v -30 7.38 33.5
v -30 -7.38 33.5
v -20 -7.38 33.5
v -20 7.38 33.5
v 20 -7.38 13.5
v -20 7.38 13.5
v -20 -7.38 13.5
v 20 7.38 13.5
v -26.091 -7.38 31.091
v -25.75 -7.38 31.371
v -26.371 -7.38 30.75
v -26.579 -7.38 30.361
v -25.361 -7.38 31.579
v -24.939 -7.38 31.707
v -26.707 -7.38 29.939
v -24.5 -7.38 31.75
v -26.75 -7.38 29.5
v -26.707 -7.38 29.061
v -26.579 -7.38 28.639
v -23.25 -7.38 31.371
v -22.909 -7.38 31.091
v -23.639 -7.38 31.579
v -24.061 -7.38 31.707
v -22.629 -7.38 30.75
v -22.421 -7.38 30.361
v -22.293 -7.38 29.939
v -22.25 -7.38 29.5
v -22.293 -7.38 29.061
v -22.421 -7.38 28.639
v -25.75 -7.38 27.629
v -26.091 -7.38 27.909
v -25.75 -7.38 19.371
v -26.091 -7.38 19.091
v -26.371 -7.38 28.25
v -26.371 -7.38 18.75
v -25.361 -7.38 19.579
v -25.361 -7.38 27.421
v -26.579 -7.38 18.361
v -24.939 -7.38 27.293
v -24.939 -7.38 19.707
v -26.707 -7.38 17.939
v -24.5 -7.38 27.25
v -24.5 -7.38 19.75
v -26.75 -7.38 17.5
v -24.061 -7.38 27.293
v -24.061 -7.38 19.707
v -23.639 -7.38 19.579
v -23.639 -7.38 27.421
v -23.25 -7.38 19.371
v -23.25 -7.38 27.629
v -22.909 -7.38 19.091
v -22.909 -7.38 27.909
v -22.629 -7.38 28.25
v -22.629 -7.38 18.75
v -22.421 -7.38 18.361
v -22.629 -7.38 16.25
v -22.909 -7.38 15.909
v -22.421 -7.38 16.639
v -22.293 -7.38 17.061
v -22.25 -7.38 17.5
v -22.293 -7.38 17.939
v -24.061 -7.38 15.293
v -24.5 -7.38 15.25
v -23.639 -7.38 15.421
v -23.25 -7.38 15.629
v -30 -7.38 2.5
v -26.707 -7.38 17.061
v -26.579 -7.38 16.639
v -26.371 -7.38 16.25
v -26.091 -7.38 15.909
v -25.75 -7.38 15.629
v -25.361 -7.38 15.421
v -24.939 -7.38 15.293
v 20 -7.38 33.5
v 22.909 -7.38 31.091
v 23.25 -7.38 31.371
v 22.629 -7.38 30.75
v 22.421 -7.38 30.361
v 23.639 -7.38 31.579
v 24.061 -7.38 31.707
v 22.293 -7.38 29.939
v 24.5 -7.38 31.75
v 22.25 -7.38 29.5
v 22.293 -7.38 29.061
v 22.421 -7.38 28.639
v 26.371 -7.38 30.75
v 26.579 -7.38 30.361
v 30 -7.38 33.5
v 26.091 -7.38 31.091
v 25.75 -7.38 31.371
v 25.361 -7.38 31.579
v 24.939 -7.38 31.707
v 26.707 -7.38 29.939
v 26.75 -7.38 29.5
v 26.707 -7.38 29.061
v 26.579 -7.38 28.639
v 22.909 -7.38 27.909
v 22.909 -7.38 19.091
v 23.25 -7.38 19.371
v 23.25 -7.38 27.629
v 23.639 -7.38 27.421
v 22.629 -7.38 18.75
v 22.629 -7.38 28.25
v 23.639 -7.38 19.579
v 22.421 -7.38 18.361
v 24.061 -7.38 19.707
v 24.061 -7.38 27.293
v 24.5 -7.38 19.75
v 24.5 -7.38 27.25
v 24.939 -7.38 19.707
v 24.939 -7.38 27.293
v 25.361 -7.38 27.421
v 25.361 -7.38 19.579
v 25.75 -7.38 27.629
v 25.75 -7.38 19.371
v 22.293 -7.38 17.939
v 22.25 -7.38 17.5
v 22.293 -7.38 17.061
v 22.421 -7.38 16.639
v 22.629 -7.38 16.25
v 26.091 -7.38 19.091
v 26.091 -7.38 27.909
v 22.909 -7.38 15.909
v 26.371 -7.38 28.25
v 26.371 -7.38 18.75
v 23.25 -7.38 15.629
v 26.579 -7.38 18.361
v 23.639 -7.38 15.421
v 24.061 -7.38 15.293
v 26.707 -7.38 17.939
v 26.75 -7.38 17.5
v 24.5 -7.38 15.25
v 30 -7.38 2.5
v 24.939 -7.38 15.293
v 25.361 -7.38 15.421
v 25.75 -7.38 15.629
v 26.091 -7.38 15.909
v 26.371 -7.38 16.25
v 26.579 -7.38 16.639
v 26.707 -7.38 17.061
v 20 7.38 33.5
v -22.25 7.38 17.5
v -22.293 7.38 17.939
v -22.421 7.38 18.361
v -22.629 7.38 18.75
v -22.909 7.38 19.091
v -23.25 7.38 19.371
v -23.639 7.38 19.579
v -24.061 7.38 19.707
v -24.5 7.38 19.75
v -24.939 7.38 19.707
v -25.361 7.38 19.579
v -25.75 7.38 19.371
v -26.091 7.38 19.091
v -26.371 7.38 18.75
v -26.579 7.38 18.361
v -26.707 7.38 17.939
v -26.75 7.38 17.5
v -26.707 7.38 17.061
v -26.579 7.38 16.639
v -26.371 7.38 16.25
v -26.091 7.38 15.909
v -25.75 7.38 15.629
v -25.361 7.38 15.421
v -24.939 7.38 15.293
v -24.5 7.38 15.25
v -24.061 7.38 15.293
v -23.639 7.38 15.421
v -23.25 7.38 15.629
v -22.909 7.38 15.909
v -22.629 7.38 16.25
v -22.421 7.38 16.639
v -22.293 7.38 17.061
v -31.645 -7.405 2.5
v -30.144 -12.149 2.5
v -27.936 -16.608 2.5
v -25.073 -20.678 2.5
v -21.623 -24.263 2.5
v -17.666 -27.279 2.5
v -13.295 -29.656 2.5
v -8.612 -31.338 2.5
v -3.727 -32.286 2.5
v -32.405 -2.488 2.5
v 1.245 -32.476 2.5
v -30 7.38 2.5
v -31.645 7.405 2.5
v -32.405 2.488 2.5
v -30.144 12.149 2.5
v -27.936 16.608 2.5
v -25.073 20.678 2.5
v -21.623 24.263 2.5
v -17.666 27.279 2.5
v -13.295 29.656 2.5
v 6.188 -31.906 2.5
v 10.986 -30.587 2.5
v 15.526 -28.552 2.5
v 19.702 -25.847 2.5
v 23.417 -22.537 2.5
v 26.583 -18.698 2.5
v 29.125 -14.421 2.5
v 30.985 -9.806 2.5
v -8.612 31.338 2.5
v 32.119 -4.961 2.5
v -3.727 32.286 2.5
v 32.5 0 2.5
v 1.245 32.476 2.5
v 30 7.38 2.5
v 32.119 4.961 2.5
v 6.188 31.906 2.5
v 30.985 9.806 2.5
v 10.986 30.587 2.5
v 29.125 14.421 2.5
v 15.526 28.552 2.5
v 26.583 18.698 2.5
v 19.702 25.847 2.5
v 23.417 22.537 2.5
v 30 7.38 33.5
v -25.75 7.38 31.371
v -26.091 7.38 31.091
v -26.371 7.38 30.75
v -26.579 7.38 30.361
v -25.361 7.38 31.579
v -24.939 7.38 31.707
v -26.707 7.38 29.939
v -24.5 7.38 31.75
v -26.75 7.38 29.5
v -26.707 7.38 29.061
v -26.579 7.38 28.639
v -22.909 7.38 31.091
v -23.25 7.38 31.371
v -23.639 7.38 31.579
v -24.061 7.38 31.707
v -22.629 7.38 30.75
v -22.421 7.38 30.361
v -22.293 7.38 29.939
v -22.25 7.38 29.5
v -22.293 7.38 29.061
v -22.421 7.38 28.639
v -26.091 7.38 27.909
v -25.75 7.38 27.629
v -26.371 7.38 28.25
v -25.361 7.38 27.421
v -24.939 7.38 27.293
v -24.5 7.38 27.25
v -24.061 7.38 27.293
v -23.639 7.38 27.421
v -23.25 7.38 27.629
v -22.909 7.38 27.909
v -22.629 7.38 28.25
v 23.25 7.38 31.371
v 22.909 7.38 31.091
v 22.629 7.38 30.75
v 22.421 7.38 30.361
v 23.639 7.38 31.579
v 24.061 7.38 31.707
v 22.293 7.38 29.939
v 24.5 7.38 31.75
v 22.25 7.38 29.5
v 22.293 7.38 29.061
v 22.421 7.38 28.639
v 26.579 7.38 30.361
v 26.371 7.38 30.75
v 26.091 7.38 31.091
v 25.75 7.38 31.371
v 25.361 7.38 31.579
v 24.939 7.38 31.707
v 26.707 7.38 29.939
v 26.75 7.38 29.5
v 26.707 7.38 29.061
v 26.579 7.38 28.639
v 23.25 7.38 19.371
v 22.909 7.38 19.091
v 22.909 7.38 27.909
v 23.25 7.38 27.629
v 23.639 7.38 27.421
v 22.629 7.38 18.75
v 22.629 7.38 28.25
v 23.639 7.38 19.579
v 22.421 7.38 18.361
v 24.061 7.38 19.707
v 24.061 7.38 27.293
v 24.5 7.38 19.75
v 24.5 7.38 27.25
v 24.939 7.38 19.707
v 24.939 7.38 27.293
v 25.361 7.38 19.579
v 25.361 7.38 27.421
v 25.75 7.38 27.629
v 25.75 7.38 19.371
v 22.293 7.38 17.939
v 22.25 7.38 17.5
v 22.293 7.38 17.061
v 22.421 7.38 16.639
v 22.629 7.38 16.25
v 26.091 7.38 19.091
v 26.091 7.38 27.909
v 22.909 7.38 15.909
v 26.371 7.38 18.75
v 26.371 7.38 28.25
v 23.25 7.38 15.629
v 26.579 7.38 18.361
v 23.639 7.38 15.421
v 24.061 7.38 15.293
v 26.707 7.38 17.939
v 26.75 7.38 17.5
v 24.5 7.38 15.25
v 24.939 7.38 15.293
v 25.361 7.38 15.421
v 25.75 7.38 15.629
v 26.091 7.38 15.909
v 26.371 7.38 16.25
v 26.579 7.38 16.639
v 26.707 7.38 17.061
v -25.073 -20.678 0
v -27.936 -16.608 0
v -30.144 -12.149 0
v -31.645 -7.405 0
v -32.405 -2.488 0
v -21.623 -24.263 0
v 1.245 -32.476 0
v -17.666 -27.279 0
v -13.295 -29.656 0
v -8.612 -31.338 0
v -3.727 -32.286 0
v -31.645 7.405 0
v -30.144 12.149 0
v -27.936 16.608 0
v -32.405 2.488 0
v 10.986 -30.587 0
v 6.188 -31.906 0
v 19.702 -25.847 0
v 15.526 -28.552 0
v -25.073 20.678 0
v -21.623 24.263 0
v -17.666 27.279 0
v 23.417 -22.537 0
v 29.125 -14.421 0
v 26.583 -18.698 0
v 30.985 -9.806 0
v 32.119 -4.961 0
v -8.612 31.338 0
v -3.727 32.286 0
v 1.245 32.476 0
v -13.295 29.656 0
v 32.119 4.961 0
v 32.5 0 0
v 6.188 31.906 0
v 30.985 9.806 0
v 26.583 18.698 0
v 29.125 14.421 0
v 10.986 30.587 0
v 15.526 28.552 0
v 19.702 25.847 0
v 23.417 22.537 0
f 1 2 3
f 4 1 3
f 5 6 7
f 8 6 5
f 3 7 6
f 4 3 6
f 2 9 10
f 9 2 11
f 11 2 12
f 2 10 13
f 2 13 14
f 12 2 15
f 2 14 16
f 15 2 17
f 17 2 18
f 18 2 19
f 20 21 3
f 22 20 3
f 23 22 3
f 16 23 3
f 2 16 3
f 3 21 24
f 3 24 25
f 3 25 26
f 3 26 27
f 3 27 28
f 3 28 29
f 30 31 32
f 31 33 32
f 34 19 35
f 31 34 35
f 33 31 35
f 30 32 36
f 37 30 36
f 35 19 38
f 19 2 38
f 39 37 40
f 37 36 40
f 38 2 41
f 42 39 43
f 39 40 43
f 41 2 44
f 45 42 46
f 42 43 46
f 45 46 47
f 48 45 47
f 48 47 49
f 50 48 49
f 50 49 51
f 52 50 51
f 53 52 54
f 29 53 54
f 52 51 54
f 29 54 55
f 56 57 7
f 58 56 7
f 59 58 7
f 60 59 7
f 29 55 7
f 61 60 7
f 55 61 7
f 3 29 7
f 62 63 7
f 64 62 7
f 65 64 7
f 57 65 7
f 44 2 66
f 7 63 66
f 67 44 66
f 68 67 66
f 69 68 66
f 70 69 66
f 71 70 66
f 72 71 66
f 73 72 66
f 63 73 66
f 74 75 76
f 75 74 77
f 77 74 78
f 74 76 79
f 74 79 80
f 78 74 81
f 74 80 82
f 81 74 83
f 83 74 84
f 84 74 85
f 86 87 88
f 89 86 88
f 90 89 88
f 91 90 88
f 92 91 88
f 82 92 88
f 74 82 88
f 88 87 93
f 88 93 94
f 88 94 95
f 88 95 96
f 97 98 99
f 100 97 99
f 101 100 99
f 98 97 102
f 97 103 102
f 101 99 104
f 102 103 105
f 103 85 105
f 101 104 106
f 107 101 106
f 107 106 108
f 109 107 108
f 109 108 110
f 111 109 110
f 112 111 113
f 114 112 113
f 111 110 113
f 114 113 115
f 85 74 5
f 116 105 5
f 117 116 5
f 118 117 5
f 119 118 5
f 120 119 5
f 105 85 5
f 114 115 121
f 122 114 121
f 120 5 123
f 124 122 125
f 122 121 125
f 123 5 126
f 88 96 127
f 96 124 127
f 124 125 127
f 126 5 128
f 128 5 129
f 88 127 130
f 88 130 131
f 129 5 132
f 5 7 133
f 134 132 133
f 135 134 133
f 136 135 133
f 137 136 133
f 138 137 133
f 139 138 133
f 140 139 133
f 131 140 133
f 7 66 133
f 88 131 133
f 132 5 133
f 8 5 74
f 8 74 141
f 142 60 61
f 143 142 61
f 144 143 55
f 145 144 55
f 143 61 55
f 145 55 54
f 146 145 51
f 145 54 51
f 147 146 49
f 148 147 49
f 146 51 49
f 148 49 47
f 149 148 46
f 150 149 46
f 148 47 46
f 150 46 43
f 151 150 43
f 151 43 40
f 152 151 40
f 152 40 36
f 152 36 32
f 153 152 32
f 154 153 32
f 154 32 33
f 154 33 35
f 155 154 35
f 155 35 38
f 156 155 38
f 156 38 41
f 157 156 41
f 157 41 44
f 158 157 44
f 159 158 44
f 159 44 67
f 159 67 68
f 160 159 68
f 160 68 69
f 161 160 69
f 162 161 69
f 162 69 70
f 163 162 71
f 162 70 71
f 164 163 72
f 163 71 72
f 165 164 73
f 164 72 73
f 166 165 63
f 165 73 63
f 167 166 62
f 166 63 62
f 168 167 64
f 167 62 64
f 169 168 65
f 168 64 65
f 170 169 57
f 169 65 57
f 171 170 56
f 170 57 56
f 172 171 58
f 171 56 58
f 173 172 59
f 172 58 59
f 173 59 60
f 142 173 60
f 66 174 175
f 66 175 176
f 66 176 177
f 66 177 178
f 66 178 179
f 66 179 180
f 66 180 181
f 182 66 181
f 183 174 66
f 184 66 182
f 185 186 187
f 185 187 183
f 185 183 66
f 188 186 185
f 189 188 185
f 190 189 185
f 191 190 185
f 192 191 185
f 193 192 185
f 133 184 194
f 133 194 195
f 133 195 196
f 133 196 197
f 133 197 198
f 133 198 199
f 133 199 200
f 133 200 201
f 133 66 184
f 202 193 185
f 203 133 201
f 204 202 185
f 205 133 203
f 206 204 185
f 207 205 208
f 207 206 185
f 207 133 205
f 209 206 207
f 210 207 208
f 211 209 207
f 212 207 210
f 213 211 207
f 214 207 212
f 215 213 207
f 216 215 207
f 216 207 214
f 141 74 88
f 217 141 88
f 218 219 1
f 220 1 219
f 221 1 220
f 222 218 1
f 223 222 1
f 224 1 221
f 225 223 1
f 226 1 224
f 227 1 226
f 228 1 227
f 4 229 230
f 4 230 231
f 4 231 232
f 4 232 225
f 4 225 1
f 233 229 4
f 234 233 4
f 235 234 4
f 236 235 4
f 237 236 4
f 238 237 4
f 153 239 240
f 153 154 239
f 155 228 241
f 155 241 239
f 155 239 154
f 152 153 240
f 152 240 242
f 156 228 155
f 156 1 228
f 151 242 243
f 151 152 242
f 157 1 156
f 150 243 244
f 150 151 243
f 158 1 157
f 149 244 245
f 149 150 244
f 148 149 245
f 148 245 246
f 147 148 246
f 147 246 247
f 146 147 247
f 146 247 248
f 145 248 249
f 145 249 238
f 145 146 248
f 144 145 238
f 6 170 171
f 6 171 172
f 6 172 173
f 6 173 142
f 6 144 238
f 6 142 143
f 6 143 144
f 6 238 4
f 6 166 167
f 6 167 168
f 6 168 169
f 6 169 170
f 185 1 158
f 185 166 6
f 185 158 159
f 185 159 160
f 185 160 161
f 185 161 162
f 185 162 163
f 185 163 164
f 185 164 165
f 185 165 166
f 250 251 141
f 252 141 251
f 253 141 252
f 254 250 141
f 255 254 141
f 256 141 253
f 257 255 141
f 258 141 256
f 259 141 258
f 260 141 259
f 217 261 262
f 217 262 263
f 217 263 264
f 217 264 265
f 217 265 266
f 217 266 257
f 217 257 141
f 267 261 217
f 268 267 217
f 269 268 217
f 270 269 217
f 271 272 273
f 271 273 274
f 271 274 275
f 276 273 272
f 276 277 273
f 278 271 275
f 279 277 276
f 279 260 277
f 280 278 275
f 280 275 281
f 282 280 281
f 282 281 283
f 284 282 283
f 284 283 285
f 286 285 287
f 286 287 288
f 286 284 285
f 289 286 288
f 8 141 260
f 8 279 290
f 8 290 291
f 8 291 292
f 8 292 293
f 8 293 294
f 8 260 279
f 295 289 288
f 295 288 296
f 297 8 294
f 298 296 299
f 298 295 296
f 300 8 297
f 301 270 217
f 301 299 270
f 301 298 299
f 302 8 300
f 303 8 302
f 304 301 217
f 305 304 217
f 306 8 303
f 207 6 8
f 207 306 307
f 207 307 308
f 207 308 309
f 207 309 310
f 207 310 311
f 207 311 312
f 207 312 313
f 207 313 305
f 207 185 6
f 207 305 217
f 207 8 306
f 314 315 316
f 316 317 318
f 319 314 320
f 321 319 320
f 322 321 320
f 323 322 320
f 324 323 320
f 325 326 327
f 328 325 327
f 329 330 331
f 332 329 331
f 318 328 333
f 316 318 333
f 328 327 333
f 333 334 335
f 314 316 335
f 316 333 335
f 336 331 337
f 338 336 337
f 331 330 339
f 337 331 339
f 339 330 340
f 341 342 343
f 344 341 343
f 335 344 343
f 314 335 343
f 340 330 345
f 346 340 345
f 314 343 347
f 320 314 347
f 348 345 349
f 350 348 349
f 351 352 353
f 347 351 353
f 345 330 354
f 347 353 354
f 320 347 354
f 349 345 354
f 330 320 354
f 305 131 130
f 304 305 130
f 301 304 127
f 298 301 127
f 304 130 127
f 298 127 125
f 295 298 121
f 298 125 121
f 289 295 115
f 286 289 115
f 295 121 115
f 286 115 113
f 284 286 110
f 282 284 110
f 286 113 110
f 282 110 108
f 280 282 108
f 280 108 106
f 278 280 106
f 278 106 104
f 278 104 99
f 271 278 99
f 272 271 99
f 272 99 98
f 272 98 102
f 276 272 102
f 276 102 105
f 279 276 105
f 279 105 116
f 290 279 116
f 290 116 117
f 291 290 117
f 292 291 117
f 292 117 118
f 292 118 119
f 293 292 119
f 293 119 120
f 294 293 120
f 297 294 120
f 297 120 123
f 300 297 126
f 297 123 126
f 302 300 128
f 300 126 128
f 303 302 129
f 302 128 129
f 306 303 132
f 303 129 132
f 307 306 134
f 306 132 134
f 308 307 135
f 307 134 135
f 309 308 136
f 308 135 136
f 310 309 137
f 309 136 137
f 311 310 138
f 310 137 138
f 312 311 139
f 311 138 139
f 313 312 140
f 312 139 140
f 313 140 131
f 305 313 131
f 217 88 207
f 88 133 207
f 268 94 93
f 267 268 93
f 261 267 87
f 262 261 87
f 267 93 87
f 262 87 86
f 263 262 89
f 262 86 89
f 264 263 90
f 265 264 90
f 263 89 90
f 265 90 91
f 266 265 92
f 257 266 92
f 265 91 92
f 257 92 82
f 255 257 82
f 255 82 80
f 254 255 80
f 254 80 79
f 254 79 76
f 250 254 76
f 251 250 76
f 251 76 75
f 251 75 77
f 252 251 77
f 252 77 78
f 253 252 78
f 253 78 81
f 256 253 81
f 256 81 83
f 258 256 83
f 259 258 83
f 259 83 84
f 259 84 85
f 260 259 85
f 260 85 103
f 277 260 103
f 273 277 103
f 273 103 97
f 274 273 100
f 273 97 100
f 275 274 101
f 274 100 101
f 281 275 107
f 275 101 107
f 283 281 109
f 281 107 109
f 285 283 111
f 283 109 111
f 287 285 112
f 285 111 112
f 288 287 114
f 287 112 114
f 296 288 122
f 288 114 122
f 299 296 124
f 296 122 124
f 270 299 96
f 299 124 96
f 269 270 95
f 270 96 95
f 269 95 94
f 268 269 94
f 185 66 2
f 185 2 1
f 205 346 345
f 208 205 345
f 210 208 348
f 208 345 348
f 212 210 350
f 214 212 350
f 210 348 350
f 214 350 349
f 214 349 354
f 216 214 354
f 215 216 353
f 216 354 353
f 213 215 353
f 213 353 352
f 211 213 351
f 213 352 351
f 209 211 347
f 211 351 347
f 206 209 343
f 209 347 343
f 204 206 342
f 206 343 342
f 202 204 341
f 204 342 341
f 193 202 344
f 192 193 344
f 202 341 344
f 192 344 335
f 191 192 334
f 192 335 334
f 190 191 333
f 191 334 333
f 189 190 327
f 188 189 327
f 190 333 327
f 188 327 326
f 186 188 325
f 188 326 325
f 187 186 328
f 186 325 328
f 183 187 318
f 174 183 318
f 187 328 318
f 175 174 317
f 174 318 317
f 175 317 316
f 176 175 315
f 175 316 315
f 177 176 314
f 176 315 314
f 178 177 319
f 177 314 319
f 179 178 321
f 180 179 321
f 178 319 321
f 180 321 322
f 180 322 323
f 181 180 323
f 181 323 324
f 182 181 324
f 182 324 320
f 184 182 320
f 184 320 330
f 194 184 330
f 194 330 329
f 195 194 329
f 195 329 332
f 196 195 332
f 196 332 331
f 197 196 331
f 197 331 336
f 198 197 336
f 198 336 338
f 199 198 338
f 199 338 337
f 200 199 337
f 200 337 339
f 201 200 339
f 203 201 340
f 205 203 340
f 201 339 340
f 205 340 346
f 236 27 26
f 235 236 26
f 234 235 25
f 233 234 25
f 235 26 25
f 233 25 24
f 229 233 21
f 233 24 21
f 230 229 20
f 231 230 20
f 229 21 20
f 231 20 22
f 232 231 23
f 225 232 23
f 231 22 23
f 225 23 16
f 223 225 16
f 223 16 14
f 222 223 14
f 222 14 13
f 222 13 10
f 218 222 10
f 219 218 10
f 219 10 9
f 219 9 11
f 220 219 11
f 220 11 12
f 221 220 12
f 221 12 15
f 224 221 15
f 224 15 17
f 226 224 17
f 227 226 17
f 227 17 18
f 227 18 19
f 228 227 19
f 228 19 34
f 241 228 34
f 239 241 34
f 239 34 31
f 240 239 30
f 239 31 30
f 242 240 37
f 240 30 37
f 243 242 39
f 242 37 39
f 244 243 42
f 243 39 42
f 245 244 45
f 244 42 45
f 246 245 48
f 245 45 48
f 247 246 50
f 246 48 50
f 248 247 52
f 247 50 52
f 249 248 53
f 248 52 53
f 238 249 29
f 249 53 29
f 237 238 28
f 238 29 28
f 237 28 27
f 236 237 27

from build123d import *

# Parameters (mm, degrees)
F0_R     = 32.5
F1_DEPTH = 2.5
F2_W     = 10
F2_H     = 14.76
F2_W_2   = 40
F3_DEPTH = 11
F4_W     = 10
F4_H     = 14.76
F5_DEPTH = 20
F6_R     = 2.25
F7_DEPTH = 25.4


with BuildPart() as f1:
    # F0 (on Top) → F1 (new body)
    with BuildSketch(Plane.XY):
        Circle(F0_R)
    extrude(amount=F1_DEPTH)

    # F2 (on face) → F3 (join)
    with BuildSketch(Plane.XY.offset(2.5)):
        with Locations((25, 0)):
            Rectangle(F2_W, F2_H)
        Rectangle(F2_W_2, F2_H)
        with Locations((-25, 0)):
            Rectangle(F2_W, F2_H)
    extrude(amount=F3_DEPTH)

    # F4 (on face) → F5 (join)
    with BuildSketch(Plane.XY.offset(13.5)):
        with Locations((25, 0)):
            Rectangle(F4_W, F4_H)
        with Locations((-25, 0)):
            Rectangle(F4_W, F4_H)
    extrude(amount=F5_DEPTH)

    # F6 (on face) → F7 (cut)
    with BuildSketch(Plane.XZ.offset(7.38)):
        with Locations((-24.5, 17.5)):
            Circle(F6_R)
        with Locations((-24.5, 29.5)):
            Circle(F6_R)
        with Locations((24.5, 17.5)):
            Circle(F6_R)
        with Locations((24.5, 29.5)):
            Circle(F6_R)
    extrude(amount=-F7_DEPTH, mode=Mode.SUBTRACT)


solid = f1.part
